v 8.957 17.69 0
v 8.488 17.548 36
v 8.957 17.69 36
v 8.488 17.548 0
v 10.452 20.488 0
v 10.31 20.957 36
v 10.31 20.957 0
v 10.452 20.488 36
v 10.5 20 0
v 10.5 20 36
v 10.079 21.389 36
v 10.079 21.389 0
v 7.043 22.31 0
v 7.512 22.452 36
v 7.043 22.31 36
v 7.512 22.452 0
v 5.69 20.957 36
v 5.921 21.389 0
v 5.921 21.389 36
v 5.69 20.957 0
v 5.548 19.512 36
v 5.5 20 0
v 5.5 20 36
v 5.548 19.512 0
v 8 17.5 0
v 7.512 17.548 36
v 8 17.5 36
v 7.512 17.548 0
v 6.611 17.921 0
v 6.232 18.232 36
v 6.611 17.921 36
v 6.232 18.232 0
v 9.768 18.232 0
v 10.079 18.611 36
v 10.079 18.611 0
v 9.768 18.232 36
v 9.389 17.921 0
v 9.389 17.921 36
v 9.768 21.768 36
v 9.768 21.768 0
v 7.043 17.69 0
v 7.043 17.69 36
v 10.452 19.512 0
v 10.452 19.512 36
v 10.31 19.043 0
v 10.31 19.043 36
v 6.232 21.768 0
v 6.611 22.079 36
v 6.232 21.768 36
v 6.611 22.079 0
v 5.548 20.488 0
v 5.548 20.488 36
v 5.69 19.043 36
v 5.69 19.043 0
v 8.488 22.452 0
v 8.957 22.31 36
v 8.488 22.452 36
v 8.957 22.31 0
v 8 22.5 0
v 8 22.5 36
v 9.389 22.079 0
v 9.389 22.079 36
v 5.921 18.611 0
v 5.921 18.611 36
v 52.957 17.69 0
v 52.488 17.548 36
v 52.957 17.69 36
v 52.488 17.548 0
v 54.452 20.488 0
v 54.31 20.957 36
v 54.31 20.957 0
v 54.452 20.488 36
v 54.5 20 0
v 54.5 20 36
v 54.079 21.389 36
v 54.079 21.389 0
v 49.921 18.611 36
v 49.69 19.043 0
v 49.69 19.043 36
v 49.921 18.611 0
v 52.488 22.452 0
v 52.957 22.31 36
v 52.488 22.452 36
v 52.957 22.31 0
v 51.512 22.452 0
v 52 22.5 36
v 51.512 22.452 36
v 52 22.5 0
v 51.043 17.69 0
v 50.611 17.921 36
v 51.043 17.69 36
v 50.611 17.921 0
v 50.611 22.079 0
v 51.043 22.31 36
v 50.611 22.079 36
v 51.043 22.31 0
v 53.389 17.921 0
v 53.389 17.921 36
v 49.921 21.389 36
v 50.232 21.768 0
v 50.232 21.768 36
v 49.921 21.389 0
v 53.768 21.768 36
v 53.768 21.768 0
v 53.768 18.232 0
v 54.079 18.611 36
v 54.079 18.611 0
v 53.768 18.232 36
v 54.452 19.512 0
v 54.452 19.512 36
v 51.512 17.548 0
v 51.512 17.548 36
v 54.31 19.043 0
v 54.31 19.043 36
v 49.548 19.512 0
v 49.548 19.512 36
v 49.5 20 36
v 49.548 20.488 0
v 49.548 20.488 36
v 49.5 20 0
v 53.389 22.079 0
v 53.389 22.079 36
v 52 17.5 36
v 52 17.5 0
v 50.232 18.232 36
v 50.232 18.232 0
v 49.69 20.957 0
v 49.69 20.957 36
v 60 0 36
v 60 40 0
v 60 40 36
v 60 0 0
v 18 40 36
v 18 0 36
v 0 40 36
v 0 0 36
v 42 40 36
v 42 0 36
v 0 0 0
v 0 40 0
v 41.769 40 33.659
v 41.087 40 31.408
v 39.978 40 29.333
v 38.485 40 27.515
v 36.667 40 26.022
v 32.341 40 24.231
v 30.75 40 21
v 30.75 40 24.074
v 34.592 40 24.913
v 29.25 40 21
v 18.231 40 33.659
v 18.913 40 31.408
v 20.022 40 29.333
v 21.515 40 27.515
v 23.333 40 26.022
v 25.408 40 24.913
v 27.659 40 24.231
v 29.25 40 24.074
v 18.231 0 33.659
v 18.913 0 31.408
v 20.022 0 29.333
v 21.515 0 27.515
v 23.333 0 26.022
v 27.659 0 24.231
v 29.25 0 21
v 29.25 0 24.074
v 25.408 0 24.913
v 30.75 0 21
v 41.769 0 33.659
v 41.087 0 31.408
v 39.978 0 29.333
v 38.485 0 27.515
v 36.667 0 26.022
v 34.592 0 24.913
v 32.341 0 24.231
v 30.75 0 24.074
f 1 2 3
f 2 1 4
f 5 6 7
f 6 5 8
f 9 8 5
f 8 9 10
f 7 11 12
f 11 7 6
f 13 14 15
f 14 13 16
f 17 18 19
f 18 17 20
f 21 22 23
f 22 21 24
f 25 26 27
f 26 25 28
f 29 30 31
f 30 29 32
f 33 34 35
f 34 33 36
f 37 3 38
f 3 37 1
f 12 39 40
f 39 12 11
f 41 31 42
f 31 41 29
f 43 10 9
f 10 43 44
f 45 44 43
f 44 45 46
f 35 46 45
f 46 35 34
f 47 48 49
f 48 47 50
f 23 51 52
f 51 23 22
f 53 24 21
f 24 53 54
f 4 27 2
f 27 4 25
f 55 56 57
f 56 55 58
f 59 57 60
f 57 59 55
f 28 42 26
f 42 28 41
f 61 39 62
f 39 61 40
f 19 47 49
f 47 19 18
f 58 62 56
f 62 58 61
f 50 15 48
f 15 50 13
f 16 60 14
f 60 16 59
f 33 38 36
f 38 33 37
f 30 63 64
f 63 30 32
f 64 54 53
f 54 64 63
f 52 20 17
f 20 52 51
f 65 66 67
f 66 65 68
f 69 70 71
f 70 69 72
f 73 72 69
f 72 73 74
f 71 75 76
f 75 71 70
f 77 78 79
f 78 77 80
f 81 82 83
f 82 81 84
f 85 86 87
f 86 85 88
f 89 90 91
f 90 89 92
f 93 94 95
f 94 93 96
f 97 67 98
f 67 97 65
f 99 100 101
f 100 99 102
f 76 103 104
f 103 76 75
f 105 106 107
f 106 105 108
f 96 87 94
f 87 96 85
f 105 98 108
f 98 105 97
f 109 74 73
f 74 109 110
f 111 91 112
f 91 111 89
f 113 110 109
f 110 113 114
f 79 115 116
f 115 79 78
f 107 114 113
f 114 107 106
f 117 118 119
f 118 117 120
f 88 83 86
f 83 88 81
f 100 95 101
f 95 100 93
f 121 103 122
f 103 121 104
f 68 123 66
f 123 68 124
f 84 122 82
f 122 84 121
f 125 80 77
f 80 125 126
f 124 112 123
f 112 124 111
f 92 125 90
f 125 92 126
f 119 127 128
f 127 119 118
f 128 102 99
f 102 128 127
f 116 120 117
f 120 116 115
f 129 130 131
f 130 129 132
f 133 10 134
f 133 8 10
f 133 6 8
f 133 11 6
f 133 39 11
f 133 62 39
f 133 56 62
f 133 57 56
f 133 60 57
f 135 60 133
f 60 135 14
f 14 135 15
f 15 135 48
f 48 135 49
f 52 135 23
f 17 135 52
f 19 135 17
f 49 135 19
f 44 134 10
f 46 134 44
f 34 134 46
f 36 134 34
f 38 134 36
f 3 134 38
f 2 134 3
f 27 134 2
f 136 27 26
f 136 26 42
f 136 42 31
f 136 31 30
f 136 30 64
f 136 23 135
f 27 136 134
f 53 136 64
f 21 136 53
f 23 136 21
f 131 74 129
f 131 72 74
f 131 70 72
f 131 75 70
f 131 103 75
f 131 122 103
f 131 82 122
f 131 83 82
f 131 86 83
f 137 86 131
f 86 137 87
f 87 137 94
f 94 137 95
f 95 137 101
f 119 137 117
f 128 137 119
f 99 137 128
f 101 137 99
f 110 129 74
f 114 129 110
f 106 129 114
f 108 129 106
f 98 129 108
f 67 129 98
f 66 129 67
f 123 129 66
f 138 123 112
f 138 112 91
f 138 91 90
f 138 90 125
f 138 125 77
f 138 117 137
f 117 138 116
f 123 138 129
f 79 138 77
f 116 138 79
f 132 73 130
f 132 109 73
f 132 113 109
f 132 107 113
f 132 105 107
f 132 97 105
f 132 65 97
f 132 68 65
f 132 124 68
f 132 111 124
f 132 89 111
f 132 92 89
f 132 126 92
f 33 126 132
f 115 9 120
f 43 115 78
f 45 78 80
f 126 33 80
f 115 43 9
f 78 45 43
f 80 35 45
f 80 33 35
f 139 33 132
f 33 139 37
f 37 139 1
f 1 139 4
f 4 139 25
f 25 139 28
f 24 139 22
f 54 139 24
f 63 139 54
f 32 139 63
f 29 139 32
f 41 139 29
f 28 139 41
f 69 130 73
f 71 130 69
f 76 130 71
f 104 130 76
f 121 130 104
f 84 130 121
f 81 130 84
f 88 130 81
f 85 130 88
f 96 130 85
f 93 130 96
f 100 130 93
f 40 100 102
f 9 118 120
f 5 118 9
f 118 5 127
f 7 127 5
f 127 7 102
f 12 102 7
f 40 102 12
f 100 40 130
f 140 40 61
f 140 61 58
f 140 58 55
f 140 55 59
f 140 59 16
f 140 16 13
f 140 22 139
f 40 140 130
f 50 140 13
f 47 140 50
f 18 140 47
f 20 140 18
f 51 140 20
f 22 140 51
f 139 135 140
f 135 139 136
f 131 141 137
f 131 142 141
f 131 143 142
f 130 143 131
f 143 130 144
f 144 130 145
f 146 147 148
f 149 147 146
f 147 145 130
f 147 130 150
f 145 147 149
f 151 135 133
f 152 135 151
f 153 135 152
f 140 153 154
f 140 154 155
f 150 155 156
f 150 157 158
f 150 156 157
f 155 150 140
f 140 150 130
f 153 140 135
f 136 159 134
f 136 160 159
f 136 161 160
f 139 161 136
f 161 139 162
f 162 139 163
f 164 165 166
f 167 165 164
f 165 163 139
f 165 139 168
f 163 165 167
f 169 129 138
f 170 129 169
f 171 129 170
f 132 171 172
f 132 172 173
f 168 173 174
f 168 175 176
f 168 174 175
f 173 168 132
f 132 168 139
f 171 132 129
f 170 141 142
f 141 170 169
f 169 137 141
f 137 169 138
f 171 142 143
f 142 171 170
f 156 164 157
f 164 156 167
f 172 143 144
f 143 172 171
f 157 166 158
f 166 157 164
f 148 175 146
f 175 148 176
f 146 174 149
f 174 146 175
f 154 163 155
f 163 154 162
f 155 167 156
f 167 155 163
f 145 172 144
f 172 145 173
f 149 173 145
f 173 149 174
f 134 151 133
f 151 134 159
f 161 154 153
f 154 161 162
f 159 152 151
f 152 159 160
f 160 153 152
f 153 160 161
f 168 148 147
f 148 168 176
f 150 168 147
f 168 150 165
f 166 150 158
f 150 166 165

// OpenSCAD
$fn = 32;

// ----------------------------------------------------------------------
// Saddle clamp: split shaft clamp
// ----------------------------------------------------------------------

// --- parameters (mm) ---
blk_l = 60;               // block length, X
blk_w = 40;               // block width, Y
blk_h = 36;               // block height
clamp_r = 12;             // shaft groove radius
hole_r = 2.5;             // bolt hole radius
hole_m = 8;               // bolt hole margin from the ends
saw_w = 1.5;              // saw kerf width

saw_depth = clamp_r + 3;  // saw kerf depth

difference() {
  cube([blk_l, blk_w, blk_h]);
  translate([blk_l / 2, -1, blk_h])
    rotate([-90, 0, 0])
      cylinder(h = blk_w + 2, r = clamp_r);
  for (sx = [0, 1])
    translate([sx ? blk_l - hole_m : hole_m, blk_w / 2, -1])
      cylinder(r = hole_r, h = blk_h + 2);
  translate([blk_l / 2 - saw_w / 2, -1, blk_h - saw_depth])
    cube([saw_w, blk_w + 2, saw_depth + 1]);
}
